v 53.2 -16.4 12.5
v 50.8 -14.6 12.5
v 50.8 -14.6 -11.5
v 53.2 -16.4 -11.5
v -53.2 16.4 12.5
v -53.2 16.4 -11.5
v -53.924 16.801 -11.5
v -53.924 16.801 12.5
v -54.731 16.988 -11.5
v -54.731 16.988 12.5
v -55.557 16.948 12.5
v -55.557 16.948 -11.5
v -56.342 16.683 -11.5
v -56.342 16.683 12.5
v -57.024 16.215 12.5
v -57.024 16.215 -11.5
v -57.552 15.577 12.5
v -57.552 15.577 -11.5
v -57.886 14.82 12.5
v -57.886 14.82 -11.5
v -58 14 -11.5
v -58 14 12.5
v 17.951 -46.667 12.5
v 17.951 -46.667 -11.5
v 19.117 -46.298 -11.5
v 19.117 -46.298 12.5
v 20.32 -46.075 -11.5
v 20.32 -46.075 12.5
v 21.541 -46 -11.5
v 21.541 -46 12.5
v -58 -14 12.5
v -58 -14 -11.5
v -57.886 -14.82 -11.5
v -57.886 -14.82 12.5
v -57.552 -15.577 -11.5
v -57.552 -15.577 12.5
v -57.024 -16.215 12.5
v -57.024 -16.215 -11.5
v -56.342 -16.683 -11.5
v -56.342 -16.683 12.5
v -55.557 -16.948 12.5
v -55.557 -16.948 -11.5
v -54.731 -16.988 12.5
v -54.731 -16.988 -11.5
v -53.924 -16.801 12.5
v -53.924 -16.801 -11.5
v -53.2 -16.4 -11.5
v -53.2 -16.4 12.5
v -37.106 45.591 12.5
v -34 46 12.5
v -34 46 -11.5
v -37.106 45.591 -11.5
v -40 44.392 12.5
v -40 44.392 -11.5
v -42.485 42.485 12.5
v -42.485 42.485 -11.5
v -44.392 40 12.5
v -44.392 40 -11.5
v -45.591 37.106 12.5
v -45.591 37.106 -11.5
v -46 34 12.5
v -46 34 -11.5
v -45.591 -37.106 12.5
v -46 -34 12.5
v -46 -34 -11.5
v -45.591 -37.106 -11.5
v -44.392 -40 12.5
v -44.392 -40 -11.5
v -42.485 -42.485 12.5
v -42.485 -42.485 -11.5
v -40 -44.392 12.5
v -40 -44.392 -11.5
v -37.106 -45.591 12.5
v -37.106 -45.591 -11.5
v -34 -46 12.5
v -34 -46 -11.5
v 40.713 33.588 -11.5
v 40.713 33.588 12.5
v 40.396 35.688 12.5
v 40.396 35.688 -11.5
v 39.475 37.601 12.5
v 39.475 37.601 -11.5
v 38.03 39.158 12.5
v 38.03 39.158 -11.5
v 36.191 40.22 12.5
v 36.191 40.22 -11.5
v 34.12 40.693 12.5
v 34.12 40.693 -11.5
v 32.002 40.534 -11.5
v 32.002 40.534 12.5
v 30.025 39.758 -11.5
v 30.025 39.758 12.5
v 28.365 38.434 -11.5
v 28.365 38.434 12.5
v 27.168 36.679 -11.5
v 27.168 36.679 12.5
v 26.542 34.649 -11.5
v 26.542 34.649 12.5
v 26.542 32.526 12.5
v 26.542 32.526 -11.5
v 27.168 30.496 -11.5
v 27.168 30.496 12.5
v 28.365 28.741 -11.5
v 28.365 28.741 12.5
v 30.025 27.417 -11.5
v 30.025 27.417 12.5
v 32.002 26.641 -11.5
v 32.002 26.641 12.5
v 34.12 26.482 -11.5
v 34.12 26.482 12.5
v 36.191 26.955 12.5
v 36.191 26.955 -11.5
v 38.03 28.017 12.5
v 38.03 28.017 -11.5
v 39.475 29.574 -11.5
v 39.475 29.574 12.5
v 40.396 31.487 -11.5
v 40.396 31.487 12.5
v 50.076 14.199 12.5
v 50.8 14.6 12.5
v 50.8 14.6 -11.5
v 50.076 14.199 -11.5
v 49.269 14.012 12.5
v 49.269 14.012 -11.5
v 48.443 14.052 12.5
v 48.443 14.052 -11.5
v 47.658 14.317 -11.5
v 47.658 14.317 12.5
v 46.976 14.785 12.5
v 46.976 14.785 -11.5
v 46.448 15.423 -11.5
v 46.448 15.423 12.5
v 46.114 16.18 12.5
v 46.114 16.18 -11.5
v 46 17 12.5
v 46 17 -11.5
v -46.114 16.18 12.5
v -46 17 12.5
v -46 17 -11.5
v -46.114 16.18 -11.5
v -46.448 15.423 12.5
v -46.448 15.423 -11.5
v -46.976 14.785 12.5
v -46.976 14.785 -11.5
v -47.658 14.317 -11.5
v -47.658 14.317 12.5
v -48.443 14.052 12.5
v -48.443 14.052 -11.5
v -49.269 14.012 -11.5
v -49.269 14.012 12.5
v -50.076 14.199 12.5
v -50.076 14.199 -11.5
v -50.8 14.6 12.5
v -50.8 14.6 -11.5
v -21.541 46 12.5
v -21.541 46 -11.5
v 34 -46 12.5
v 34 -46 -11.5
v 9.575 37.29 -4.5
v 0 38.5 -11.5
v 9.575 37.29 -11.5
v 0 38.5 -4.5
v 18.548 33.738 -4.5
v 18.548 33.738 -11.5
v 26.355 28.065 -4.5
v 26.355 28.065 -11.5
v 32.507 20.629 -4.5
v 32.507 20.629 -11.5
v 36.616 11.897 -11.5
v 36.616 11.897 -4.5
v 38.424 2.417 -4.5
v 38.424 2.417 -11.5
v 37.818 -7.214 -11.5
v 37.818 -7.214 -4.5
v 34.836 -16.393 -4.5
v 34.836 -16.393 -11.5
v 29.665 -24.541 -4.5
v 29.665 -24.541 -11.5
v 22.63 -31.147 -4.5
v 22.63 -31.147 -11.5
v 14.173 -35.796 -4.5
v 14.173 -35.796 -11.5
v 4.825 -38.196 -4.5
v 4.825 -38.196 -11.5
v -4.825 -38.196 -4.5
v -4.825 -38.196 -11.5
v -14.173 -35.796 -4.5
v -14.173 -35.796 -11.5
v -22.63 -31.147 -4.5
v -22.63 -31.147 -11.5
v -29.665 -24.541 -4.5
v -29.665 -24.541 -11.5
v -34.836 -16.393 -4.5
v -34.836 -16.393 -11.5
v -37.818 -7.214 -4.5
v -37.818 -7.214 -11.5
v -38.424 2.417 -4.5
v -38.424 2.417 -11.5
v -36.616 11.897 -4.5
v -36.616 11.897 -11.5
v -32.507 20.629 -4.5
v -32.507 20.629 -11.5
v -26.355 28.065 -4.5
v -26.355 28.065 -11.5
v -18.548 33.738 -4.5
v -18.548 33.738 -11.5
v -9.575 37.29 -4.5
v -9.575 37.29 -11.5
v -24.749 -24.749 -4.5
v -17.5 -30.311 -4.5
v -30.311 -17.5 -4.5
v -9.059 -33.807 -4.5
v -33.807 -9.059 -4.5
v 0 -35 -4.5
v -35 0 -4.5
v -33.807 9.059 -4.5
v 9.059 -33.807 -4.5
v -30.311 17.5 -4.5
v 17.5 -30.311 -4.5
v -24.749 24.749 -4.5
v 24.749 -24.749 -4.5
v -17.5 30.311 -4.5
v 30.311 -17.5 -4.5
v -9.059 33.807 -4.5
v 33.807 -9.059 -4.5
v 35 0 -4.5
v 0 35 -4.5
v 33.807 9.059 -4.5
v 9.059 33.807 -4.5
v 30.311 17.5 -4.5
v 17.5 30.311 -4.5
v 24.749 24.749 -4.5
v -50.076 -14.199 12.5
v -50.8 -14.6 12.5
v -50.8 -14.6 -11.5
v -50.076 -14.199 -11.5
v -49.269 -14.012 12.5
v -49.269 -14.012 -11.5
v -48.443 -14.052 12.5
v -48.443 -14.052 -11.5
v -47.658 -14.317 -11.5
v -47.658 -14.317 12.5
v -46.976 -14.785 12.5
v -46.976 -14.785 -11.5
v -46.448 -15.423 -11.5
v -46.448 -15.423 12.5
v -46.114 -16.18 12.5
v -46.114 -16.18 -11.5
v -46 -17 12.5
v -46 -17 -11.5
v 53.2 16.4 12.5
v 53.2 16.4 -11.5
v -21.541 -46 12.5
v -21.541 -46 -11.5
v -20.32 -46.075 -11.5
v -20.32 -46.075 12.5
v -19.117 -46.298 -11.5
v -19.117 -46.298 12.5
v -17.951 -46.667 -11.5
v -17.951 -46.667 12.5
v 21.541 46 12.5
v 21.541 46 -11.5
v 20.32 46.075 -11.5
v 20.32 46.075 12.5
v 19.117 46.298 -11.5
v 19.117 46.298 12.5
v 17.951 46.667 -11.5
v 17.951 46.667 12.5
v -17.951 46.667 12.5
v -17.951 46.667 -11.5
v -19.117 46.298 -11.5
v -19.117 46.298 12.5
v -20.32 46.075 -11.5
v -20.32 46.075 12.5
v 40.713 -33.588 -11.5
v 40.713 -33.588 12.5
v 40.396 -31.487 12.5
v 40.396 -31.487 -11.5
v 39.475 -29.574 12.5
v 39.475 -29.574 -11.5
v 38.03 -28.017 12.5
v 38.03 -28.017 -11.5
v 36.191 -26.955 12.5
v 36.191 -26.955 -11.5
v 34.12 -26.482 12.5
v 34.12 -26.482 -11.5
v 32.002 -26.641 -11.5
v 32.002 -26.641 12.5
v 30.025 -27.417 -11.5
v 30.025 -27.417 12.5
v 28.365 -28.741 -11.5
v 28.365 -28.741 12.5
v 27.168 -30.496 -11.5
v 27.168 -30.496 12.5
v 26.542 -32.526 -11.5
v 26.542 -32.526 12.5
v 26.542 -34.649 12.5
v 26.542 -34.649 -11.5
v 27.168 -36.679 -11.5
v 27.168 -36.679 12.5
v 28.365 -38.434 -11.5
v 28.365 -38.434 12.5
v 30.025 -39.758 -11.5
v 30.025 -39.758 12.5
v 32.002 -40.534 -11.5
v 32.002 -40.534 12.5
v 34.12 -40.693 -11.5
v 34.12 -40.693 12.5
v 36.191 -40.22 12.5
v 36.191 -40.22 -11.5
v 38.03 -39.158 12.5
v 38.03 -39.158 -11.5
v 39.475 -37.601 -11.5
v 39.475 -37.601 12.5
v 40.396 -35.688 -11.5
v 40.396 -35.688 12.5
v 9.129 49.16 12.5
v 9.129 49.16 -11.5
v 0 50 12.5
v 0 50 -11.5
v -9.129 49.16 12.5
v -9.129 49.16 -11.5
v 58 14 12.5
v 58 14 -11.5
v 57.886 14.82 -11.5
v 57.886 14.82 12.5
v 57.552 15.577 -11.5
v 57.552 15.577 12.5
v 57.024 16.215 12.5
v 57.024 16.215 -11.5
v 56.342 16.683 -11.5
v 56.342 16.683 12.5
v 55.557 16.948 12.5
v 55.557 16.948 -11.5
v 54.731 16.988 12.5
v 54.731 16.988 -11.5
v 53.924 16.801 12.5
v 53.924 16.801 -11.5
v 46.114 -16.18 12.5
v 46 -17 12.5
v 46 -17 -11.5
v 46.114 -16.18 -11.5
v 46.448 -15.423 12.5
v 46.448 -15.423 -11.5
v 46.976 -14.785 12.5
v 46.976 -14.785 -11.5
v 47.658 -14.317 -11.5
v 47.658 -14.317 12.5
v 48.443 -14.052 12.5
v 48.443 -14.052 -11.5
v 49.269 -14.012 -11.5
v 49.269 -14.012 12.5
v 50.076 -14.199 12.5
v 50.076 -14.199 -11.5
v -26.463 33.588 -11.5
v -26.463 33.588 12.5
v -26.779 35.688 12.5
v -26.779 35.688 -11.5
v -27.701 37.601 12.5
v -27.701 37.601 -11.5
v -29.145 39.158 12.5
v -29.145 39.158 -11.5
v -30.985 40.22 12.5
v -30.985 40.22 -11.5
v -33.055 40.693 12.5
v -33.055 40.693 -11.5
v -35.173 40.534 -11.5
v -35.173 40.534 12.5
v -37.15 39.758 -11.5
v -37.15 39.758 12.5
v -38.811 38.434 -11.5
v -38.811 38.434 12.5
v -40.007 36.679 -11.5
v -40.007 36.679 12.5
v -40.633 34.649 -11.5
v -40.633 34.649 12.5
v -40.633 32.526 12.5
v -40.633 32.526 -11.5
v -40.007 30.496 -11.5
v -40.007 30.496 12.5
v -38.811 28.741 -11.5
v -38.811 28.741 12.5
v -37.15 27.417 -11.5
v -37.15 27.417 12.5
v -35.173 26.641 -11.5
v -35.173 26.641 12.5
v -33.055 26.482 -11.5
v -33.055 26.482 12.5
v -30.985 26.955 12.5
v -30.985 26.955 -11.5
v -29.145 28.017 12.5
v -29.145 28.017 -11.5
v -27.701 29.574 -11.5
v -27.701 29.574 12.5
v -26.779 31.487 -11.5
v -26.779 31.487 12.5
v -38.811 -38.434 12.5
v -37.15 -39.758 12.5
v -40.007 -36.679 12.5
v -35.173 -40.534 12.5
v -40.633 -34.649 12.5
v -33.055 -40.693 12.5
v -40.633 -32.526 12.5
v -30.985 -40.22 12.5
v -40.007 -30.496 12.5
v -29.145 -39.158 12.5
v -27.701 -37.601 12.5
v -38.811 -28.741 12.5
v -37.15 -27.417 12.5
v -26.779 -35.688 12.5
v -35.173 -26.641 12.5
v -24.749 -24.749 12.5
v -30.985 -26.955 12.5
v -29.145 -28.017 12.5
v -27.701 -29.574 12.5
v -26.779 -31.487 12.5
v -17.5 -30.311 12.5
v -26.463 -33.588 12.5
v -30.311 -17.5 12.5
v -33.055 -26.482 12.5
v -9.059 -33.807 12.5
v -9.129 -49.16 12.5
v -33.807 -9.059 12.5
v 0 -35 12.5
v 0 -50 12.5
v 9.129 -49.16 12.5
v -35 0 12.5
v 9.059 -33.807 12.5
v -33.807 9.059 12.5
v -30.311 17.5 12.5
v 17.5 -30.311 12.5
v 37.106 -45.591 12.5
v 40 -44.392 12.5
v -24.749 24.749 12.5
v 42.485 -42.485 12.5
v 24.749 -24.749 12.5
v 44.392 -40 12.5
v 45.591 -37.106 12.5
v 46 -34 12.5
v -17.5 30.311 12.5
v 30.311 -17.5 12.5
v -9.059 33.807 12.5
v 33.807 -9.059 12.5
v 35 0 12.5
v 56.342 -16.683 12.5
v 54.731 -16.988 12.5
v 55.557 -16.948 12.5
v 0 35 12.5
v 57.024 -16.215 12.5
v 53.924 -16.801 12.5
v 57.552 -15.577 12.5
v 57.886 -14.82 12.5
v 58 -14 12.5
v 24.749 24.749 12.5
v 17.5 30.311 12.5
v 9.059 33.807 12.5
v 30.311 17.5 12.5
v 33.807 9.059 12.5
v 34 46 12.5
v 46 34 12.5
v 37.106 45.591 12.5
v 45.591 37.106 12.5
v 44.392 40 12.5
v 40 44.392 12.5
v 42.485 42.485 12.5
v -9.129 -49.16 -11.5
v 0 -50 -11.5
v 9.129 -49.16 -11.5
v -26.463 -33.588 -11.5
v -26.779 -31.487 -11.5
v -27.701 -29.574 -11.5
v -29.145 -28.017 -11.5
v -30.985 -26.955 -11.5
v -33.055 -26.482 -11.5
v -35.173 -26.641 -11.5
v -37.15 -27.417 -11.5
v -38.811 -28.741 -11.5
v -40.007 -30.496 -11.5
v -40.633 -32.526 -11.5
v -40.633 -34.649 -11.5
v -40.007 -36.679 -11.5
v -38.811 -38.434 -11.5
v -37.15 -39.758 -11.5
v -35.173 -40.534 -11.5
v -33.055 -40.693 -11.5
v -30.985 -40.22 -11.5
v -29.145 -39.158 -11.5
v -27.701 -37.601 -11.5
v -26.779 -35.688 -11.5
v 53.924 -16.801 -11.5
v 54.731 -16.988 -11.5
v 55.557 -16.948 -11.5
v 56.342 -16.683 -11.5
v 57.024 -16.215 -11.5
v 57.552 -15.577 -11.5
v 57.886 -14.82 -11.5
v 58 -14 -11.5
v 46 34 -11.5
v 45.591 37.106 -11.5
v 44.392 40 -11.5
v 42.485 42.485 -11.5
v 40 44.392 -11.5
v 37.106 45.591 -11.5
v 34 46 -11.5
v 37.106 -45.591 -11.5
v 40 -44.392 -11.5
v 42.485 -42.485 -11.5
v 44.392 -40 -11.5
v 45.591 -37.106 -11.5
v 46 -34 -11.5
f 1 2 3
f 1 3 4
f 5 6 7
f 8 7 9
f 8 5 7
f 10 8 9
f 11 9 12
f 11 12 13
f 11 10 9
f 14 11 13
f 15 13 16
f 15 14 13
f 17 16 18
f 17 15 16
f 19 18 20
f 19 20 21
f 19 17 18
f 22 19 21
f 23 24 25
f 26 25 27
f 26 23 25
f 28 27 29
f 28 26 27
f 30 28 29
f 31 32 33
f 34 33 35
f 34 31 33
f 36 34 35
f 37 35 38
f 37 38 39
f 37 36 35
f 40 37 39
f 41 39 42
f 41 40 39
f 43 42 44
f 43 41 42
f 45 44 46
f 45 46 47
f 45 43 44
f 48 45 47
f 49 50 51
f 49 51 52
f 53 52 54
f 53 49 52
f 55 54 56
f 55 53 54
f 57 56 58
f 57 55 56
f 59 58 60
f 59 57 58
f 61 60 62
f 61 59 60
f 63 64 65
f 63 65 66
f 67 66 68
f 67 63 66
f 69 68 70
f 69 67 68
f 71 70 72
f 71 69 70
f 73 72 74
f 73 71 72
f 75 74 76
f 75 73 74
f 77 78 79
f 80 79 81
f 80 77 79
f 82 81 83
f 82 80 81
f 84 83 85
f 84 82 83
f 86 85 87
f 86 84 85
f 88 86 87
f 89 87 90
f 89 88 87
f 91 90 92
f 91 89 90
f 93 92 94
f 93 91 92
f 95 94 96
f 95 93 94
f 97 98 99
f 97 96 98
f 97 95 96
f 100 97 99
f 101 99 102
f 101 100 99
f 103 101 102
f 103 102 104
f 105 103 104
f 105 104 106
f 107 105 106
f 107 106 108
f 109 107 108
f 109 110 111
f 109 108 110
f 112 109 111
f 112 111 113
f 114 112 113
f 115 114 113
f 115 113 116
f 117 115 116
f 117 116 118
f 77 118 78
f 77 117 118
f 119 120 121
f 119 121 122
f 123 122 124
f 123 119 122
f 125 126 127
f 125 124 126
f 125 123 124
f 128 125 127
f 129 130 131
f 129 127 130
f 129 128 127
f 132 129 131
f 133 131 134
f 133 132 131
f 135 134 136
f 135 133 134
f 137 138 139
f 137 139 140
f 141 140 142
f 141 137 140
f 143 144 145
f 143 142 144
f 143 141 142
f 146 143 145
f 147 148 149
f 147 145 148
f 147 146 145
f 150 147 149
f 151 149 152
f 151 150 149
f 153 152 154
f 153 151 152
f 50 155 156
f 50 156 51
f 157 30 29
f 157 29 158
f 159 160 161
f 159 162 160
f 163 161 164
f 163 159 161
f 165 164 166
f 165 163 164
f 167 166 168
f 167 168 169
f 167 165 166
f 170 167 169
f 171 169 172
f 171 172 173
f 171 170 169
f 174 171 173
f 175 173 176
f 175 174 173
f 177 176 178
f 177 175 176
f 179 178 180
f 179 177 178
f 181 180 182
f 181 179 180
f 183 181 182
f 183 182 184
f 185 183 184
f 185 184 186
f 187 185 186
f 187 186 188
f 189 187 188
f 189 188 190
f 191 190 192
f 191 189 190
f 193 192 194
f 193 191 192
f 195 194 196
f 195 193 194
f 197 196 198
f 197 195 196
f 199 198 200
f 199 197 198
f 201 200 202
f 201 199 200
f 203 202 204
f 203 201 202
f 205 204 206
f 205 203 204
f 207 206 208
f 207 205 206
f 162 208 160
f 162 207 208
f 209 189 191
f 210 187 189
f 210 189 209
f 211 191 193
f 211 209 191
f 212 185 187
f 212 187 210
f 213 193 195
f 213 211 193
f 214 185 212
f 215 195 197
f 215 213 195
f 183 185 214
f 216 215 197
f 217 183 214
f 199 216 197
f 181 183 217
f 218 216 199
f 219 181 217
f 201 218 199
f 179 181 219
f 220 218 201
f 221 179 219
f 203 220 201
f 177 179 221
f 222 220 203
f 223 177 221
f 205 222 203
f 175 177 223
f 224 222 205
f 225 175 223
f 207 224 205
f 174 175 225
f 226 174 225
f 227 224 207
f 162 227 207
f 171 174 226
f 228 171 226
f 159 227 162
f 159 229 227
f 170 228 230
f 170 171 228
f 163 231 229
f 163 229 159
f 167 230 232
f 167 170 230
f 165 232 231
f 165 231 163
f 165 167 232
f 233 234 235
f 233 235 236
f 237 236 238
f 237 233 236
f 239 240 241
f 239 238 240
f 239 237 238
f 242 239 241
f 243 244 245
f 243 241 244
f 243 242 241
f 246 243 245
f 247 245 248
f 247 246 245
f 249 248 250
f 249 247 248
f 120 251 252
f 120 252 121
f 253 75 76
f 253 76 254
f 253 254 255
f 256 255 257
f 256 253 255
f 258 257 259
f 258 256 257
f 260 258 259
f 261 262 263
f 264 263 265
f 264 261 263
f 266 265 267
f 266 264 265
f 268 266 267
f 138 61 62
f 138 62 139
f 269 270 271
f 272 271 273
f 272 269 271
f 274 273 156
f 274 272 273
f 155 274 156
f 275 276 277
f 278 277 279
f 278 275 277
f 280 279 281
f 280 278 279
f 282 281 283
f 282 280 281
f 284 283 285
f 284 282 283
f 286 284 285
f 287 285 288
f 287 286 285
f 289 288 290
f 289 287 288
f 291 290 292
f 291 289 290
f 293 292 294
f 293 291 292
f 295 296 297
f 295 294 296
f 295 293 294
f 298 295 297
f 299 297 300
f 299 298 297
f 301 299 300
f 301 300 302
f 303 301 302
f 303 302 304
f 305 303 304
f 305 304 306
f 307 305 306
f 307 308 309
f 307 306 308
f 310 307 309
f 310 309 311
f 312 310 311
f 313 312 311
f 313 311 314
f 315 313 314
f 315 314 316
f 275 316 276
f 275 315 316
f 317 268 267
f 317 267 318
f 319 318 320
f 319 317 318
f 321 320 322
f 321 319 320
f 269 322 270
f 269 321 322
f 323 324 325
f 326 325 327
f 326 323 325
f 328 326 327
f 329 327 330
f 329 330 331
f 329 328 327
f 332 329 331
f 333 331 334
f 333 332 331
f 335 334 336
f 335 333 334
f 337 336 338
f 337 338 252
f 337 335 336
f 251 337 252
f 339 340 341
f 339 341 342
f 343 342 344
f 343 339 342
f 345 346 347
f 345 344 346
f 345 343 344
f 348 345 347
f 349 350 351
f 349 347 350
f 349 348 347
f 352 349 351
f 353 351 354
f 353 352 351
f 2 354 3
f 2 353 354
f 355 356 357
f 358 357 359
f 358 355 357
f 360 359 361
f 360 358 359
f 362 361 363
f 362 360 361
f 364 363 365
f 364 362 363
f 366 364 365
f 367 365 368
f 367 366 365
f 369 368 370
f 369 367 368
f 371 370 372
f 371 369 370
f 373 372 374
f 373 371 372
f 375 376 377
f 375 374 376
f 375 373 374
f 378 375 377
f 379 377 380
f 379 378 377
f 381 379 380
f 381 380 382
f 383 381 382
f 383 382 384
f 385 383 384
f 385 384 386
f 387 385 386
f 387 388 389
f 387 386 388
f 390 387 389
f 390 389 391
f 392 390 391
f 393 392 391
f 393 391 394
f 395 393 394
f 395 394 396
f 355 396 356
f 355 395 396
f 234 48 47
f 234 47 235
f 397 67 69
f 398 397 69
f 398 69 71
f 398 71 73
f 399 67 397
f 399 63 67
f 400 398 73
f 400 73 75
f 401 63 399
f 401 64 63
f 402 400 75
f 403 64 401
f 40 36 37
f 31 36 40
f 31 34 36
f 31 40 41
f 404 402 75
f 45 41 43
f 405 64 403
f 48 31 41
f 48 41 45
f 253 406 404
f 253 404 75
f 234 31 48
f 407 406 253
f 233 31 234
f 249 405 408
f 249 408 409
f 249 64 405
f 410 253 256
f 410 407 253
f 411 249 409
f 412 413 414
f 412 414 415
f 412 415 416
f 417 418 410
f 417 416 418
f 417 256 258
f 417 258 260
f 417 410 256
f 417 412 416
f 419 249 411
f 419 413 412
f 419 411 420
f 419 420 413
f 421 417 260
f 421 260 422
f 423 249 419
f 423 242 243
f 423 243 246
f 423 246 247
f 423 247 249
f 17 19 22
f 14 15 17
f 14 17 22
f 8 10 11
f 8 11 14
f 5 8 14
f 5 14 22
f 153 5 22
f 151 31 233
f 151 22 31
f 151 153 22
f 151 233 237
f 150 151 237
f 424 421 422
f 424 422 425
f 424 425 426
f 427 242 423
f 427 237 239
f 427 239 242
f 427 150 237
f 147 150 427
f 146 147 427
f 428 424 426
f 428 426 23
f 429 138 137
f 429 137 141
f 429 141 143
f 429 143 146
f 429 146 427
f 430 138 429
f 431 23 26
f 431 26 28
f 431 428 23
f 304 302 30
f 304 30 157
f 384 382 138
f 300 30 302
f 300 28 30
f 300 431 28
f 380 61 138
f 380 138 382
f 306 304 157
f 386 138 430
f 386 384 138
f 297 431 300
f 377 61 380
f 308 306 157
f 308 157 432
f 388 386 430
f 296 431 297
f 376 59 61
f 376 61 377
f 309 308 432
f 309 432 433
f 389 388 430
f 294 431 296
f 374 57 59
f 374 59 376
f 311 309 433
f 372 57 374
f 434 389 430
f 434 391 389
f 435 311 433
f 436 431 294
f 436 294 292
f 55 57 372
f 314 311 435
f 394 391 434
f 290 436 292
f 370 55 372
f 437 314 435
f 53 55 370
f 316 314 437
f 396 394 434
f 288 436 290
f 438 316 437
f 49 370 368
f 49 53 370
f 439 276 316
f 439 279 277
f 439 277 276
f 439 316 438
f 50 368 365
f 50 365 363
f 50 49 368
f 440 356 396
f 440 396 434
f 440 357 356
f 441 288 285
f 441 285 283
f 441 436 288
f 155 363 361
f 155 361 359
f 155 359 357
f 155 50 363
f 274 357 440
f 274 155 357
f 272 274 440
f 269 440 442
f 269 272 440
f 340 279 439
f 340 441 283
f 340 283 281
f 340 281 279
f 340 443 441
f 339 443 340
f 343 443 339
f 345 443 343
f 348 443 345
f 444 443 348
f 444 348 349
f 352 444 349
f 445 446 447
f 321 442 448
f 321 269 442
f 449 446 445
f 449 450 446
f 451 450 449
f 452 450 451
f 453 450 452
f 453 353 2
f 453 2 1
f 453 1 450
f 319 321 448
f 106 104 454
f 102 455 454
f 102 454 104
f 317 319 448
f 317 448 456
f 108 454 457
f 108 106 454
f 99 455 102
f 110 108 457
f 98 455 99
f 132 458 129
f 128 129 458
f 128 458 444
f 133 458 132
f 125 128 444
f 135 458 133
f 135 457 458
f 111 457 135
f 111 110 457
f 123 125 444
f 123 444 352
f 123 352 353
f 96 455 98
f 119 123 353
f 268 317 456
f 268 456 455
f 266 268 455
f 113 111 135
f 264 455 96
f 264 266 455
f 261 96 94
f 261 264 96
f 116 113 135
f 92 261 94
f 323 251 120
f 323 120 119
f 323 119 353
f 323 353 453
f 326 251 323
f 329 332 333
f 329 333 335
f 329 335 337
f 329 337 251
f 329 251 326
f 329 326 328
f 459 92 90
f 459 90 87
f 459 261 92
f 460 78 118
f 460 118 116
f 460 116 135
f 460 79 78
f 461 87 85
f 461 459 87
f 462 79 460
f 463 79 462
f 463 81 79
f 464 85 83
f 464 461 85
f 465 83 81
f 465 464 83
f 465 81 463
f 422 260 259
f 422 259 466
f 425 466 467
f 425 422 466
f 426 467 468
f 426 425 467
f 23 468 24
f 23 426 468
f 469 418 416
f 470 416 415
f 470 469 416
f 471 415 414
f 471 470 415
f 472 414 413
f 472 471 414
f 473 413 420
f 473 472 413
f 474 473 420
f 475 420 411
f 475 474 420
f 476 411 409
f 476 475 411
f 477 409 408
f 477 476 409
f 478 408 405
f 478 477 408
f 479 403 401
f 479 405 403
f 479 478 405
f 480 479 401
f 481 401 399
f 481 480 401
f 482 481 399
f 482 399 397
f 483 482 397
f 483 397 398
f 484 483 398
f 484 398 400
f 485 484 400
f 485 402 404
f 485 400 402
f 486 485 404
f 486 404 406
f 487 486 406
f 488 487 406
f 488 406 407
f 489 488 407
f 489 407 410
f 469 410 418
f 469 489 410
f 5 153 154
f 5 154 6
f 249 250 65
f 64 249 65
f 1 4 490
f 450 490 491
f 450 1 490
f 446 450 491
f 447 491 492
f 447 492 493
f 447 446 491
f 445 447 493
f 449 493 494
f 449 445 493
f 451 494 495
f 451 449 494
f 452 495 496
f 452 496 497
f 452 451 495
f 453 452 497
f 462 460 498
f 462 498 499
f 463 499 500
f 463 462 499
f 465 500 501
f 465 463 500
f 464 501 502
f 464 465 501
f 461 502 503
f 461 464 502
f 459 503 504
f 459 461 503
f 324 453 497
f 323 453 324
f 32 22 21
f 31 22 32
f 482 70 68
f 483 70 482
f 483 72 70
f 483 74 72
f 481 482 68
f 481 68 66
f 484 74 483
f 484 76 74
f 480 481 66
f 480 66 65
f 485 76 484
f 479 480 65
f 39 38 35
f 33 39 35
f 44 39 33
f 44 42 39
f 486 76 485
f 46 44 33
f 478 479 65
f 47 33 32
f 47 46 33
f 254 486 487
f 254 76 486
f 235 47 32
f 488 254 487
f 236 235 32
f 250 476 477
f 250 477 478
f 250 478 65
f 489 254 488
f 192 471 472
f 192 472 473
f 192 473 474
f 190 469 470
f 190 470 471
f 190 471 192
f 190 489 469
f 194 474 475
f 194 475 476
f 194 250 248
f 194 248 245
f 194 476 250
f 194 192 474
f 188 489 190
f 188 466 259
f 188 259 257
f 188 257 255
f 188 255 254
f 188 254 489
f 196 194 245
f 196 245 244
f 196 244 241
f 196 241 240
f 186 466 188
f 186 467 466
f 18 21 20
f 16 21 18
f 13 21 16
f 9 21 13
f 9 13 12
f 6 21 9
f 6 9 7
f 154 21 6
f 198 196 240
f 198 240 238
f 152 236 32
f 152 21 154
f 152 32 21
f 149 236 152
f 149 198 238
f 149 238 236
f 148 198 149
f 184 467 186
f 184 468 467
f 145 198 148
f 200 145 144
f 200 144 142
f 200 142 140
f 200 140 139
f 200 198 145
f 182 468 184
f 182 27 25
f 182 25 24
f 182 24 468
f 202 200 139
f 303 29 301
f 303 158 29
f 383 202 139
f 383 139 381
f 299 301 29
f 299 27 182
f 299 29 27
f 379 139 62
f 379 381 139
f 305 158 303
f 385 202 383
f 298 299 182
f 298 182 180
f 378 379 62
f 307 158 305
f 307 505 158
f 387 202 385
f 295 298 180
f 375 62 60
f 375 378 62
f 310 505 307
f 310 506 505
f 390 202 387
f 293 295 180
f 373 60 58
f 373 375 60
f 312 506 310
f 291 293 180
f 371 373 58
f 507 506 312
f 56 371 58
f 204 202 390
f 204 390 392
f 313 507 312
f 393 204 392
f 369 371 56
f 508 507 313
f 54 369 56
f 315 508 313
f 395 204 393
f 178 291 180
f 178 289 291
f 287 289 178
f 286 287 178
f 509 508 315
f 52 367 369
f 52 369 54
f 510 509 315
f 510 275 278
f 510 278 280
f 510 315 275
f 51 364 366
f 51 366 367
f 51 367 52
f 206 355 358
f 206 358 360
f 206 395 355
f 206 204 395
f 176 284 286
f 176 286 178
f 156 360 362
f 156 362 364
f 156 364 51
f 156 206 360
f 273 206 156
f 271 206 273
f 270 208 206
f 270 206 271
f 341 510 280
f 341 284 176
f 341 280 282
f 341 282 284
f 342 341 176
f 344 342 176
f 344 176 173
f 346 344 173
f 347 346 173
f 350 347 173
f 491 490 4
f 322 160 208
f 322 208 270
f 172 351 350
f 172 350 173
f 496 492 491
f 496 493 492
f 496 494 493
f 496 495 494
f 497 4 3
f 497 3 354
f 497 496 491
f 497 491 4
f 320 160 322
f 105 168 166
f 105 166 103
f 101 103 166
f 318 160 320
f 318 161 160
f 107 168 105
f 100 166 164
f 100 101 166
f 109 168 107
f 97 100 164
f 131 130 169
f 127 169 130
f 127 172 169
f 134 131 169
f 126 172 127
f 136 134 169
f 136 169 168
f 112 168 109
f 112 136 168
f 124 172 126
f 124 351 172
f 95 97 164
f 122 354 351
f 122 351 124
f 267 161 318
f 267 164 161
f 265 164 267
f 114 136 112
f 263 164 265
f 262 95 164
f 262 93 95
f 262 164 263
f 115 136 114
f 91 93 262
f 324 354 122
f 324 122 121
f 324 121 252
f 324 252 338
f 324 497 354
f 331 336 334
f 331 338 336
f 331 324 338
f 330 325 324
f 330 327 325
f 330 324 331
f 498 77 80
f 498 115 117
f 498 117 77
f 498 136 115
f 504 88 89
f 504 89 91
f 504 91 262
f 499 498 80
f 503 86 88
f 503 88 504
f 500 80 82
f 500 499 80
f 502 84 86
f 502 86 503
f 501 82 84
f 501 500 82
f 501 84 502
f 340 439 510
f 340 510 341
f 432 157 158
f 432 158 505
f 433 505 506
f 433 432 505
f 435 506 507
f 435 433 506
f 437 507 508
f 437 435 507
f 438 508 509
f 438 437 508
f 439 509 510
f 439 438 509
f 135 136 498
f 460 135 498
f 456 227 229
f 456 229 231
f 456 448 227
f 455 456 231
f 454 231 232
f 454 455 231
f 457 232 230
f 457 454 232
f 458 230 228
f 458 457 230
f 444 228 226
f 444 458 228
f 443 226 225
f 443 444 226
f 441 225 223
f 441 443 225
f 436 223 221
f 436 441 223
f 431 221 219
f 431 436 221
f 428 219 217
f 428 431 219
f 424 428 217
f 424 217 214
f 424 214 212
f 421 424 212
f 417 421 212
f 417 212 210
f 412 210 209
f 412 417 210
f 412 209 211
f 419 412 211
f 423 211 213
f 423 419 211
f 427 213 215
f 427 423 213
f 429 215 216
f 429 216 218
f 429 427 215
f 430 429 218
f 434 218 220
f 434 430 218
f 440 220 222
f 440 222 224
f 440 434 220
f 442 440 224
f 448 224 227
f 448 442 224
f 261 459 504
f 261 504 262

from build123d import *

# Parameters (mm, degrees)
SKETCH1_R                  = 31
BASE_EXTRUDE_DEPTH         = 12.5
SKETCH4_R                  = 7.125
F_4_STK_14_25_HULLER_DEPTH = 25


with BuildPart() as part:
    # Sketch1 → Base-Extrude (new body, symmetric)
    with BuildSketch(Plane.XY):
        with BuildLine():
            Line((34, 46), (21.540659229, 46))
            ThreePointArc((21.540659229, 46), (19.71491737, 46.168079197), (17.950549357, 46.666666667))
            ThreePointArc((17.950549357, 46.666666667), (0, 50), (-17.950549357, 46.666666667))
            ThreePointArc((-17.950549357, 46.666666667), (-19.71491737, 46.168079197), (-21.540659229, 46))
            Line((-21.540659229, 46), (-34, 46))
            ThreePointArc((-34, 46), (-42.485281374, 42.485281374), (-46, 34))
            Line((-46, 34), (-46, 17))
            ThreePointArc((-46, 17), (-47.658359214, 14.316718427), (-50.8, 14.6))
            Line((-50.8, 14.6), (-53.2, 16.4))
            ThreePointArc((-53.2, 16.4), (-56.341640786, 16.683281573), (-58, 14))
            Line((-58, 14), (-58, -14))
            ThreePointArc((-58, -14), (-56.341640786, -16.683281573), (-53.2, -16.4))
            Line((-53.2, -16.4), (-50.8, -14.6))
            ThreePointArc((-50.8, -14.6), (-47.658359214, -14.316718427), (-46, -17))
            Line((-46, -17), (-46, -34))
            ThreePointArc((-46, -34), (-42.485281374, -42.485281374), (-34, -46))
            Line((-34, -46), (-21.540659229, -46))
            ThreePointArc((-21.540659229, -46), (-19.71491737, -46.168079197), (-17.950549357, -46.666666667))
            ThreePointArc((-17.950549357, -46.666666667), (0, -50), (17.950549357, -46.666666667))
            ThreePointArc((17.950549357, -46.666666667), (19.71491737, -46.168079197), (21.540659229, -46))
            Line((21.540659229, -46), (34, -46))
            ThreePointArc((34, -46), (42.485281374, -42.485281374), (46, -34))
            Line((46, -34), (46, -17))
            ThreePointArc((46, -17), (47.658359214, -14.316718427), (50.8, -14.6))
            Line((50.8, -14.6), (53.2, -16.4))
            ThreePointArc((53.2, -16.4), (56.341640786, -16.683281573), (58, -14))
            Line((58, -14), (58, 14))
            ThreePointArc((58, 14), (56.341640786, 16.683281573), (53.2, 16.4))
            Line((53.2, 16.4), (50.8, 14.6))
            ThreePointArc((50.8, 14.6), (47.658359214, 14.316718427), (46, 17))
            Line((46, 17), (46, 34))
            ThreePointArc((46, 34), (42.485281374, 42.485281374), (34, 46))
        make_face()
        Circle(SKETCH1_R, mode=Mode.SUBTRACT)
    extrude(amount=BASE_EXTRUDE_DEPTH, both=True)

    # Sketch2 → Uddrejning (revolve, cut)
    with BuildSketch(Plane(origin=(0, 0, 0), x_dir=(0, 0, -1), z_dir=(1, 0, 0))):
        Polygon((11.5, 38.5), (4.5, 38.5), (4.5, 35), (-12.5, 35), (-12.5, 0), (12.5, 0), (12.5, 70), (11.5, 70), align=None)
    revolve(axis=Axis((0, 0, 0), (0, 0, -1)), mode=Mode.SUBTRACT)

    # Sketch4 → 4 stk ø14.25 huller (cut, through all)
    with BuildSketch(Plane.XY.offset(-11.5)):
        with Locations((33.587572106, 33.587572106)):
            Circle(SKETCH4_R)
        with Locations((33.587572106, -33.587572106)):
            Circle(SKETCH4_R)
        with Locations((-33.587572106, -33.587572106)):
            Circle(SKETCH4_R)
        with Locations((-33.587572106, 33.587572106)):
            Circle(SKETCH4_R)
    extrude(amount=F_4_STK_14_25_HULLER_DEPTH, mode=Mode.SUBTRACT)


solid = part.part
